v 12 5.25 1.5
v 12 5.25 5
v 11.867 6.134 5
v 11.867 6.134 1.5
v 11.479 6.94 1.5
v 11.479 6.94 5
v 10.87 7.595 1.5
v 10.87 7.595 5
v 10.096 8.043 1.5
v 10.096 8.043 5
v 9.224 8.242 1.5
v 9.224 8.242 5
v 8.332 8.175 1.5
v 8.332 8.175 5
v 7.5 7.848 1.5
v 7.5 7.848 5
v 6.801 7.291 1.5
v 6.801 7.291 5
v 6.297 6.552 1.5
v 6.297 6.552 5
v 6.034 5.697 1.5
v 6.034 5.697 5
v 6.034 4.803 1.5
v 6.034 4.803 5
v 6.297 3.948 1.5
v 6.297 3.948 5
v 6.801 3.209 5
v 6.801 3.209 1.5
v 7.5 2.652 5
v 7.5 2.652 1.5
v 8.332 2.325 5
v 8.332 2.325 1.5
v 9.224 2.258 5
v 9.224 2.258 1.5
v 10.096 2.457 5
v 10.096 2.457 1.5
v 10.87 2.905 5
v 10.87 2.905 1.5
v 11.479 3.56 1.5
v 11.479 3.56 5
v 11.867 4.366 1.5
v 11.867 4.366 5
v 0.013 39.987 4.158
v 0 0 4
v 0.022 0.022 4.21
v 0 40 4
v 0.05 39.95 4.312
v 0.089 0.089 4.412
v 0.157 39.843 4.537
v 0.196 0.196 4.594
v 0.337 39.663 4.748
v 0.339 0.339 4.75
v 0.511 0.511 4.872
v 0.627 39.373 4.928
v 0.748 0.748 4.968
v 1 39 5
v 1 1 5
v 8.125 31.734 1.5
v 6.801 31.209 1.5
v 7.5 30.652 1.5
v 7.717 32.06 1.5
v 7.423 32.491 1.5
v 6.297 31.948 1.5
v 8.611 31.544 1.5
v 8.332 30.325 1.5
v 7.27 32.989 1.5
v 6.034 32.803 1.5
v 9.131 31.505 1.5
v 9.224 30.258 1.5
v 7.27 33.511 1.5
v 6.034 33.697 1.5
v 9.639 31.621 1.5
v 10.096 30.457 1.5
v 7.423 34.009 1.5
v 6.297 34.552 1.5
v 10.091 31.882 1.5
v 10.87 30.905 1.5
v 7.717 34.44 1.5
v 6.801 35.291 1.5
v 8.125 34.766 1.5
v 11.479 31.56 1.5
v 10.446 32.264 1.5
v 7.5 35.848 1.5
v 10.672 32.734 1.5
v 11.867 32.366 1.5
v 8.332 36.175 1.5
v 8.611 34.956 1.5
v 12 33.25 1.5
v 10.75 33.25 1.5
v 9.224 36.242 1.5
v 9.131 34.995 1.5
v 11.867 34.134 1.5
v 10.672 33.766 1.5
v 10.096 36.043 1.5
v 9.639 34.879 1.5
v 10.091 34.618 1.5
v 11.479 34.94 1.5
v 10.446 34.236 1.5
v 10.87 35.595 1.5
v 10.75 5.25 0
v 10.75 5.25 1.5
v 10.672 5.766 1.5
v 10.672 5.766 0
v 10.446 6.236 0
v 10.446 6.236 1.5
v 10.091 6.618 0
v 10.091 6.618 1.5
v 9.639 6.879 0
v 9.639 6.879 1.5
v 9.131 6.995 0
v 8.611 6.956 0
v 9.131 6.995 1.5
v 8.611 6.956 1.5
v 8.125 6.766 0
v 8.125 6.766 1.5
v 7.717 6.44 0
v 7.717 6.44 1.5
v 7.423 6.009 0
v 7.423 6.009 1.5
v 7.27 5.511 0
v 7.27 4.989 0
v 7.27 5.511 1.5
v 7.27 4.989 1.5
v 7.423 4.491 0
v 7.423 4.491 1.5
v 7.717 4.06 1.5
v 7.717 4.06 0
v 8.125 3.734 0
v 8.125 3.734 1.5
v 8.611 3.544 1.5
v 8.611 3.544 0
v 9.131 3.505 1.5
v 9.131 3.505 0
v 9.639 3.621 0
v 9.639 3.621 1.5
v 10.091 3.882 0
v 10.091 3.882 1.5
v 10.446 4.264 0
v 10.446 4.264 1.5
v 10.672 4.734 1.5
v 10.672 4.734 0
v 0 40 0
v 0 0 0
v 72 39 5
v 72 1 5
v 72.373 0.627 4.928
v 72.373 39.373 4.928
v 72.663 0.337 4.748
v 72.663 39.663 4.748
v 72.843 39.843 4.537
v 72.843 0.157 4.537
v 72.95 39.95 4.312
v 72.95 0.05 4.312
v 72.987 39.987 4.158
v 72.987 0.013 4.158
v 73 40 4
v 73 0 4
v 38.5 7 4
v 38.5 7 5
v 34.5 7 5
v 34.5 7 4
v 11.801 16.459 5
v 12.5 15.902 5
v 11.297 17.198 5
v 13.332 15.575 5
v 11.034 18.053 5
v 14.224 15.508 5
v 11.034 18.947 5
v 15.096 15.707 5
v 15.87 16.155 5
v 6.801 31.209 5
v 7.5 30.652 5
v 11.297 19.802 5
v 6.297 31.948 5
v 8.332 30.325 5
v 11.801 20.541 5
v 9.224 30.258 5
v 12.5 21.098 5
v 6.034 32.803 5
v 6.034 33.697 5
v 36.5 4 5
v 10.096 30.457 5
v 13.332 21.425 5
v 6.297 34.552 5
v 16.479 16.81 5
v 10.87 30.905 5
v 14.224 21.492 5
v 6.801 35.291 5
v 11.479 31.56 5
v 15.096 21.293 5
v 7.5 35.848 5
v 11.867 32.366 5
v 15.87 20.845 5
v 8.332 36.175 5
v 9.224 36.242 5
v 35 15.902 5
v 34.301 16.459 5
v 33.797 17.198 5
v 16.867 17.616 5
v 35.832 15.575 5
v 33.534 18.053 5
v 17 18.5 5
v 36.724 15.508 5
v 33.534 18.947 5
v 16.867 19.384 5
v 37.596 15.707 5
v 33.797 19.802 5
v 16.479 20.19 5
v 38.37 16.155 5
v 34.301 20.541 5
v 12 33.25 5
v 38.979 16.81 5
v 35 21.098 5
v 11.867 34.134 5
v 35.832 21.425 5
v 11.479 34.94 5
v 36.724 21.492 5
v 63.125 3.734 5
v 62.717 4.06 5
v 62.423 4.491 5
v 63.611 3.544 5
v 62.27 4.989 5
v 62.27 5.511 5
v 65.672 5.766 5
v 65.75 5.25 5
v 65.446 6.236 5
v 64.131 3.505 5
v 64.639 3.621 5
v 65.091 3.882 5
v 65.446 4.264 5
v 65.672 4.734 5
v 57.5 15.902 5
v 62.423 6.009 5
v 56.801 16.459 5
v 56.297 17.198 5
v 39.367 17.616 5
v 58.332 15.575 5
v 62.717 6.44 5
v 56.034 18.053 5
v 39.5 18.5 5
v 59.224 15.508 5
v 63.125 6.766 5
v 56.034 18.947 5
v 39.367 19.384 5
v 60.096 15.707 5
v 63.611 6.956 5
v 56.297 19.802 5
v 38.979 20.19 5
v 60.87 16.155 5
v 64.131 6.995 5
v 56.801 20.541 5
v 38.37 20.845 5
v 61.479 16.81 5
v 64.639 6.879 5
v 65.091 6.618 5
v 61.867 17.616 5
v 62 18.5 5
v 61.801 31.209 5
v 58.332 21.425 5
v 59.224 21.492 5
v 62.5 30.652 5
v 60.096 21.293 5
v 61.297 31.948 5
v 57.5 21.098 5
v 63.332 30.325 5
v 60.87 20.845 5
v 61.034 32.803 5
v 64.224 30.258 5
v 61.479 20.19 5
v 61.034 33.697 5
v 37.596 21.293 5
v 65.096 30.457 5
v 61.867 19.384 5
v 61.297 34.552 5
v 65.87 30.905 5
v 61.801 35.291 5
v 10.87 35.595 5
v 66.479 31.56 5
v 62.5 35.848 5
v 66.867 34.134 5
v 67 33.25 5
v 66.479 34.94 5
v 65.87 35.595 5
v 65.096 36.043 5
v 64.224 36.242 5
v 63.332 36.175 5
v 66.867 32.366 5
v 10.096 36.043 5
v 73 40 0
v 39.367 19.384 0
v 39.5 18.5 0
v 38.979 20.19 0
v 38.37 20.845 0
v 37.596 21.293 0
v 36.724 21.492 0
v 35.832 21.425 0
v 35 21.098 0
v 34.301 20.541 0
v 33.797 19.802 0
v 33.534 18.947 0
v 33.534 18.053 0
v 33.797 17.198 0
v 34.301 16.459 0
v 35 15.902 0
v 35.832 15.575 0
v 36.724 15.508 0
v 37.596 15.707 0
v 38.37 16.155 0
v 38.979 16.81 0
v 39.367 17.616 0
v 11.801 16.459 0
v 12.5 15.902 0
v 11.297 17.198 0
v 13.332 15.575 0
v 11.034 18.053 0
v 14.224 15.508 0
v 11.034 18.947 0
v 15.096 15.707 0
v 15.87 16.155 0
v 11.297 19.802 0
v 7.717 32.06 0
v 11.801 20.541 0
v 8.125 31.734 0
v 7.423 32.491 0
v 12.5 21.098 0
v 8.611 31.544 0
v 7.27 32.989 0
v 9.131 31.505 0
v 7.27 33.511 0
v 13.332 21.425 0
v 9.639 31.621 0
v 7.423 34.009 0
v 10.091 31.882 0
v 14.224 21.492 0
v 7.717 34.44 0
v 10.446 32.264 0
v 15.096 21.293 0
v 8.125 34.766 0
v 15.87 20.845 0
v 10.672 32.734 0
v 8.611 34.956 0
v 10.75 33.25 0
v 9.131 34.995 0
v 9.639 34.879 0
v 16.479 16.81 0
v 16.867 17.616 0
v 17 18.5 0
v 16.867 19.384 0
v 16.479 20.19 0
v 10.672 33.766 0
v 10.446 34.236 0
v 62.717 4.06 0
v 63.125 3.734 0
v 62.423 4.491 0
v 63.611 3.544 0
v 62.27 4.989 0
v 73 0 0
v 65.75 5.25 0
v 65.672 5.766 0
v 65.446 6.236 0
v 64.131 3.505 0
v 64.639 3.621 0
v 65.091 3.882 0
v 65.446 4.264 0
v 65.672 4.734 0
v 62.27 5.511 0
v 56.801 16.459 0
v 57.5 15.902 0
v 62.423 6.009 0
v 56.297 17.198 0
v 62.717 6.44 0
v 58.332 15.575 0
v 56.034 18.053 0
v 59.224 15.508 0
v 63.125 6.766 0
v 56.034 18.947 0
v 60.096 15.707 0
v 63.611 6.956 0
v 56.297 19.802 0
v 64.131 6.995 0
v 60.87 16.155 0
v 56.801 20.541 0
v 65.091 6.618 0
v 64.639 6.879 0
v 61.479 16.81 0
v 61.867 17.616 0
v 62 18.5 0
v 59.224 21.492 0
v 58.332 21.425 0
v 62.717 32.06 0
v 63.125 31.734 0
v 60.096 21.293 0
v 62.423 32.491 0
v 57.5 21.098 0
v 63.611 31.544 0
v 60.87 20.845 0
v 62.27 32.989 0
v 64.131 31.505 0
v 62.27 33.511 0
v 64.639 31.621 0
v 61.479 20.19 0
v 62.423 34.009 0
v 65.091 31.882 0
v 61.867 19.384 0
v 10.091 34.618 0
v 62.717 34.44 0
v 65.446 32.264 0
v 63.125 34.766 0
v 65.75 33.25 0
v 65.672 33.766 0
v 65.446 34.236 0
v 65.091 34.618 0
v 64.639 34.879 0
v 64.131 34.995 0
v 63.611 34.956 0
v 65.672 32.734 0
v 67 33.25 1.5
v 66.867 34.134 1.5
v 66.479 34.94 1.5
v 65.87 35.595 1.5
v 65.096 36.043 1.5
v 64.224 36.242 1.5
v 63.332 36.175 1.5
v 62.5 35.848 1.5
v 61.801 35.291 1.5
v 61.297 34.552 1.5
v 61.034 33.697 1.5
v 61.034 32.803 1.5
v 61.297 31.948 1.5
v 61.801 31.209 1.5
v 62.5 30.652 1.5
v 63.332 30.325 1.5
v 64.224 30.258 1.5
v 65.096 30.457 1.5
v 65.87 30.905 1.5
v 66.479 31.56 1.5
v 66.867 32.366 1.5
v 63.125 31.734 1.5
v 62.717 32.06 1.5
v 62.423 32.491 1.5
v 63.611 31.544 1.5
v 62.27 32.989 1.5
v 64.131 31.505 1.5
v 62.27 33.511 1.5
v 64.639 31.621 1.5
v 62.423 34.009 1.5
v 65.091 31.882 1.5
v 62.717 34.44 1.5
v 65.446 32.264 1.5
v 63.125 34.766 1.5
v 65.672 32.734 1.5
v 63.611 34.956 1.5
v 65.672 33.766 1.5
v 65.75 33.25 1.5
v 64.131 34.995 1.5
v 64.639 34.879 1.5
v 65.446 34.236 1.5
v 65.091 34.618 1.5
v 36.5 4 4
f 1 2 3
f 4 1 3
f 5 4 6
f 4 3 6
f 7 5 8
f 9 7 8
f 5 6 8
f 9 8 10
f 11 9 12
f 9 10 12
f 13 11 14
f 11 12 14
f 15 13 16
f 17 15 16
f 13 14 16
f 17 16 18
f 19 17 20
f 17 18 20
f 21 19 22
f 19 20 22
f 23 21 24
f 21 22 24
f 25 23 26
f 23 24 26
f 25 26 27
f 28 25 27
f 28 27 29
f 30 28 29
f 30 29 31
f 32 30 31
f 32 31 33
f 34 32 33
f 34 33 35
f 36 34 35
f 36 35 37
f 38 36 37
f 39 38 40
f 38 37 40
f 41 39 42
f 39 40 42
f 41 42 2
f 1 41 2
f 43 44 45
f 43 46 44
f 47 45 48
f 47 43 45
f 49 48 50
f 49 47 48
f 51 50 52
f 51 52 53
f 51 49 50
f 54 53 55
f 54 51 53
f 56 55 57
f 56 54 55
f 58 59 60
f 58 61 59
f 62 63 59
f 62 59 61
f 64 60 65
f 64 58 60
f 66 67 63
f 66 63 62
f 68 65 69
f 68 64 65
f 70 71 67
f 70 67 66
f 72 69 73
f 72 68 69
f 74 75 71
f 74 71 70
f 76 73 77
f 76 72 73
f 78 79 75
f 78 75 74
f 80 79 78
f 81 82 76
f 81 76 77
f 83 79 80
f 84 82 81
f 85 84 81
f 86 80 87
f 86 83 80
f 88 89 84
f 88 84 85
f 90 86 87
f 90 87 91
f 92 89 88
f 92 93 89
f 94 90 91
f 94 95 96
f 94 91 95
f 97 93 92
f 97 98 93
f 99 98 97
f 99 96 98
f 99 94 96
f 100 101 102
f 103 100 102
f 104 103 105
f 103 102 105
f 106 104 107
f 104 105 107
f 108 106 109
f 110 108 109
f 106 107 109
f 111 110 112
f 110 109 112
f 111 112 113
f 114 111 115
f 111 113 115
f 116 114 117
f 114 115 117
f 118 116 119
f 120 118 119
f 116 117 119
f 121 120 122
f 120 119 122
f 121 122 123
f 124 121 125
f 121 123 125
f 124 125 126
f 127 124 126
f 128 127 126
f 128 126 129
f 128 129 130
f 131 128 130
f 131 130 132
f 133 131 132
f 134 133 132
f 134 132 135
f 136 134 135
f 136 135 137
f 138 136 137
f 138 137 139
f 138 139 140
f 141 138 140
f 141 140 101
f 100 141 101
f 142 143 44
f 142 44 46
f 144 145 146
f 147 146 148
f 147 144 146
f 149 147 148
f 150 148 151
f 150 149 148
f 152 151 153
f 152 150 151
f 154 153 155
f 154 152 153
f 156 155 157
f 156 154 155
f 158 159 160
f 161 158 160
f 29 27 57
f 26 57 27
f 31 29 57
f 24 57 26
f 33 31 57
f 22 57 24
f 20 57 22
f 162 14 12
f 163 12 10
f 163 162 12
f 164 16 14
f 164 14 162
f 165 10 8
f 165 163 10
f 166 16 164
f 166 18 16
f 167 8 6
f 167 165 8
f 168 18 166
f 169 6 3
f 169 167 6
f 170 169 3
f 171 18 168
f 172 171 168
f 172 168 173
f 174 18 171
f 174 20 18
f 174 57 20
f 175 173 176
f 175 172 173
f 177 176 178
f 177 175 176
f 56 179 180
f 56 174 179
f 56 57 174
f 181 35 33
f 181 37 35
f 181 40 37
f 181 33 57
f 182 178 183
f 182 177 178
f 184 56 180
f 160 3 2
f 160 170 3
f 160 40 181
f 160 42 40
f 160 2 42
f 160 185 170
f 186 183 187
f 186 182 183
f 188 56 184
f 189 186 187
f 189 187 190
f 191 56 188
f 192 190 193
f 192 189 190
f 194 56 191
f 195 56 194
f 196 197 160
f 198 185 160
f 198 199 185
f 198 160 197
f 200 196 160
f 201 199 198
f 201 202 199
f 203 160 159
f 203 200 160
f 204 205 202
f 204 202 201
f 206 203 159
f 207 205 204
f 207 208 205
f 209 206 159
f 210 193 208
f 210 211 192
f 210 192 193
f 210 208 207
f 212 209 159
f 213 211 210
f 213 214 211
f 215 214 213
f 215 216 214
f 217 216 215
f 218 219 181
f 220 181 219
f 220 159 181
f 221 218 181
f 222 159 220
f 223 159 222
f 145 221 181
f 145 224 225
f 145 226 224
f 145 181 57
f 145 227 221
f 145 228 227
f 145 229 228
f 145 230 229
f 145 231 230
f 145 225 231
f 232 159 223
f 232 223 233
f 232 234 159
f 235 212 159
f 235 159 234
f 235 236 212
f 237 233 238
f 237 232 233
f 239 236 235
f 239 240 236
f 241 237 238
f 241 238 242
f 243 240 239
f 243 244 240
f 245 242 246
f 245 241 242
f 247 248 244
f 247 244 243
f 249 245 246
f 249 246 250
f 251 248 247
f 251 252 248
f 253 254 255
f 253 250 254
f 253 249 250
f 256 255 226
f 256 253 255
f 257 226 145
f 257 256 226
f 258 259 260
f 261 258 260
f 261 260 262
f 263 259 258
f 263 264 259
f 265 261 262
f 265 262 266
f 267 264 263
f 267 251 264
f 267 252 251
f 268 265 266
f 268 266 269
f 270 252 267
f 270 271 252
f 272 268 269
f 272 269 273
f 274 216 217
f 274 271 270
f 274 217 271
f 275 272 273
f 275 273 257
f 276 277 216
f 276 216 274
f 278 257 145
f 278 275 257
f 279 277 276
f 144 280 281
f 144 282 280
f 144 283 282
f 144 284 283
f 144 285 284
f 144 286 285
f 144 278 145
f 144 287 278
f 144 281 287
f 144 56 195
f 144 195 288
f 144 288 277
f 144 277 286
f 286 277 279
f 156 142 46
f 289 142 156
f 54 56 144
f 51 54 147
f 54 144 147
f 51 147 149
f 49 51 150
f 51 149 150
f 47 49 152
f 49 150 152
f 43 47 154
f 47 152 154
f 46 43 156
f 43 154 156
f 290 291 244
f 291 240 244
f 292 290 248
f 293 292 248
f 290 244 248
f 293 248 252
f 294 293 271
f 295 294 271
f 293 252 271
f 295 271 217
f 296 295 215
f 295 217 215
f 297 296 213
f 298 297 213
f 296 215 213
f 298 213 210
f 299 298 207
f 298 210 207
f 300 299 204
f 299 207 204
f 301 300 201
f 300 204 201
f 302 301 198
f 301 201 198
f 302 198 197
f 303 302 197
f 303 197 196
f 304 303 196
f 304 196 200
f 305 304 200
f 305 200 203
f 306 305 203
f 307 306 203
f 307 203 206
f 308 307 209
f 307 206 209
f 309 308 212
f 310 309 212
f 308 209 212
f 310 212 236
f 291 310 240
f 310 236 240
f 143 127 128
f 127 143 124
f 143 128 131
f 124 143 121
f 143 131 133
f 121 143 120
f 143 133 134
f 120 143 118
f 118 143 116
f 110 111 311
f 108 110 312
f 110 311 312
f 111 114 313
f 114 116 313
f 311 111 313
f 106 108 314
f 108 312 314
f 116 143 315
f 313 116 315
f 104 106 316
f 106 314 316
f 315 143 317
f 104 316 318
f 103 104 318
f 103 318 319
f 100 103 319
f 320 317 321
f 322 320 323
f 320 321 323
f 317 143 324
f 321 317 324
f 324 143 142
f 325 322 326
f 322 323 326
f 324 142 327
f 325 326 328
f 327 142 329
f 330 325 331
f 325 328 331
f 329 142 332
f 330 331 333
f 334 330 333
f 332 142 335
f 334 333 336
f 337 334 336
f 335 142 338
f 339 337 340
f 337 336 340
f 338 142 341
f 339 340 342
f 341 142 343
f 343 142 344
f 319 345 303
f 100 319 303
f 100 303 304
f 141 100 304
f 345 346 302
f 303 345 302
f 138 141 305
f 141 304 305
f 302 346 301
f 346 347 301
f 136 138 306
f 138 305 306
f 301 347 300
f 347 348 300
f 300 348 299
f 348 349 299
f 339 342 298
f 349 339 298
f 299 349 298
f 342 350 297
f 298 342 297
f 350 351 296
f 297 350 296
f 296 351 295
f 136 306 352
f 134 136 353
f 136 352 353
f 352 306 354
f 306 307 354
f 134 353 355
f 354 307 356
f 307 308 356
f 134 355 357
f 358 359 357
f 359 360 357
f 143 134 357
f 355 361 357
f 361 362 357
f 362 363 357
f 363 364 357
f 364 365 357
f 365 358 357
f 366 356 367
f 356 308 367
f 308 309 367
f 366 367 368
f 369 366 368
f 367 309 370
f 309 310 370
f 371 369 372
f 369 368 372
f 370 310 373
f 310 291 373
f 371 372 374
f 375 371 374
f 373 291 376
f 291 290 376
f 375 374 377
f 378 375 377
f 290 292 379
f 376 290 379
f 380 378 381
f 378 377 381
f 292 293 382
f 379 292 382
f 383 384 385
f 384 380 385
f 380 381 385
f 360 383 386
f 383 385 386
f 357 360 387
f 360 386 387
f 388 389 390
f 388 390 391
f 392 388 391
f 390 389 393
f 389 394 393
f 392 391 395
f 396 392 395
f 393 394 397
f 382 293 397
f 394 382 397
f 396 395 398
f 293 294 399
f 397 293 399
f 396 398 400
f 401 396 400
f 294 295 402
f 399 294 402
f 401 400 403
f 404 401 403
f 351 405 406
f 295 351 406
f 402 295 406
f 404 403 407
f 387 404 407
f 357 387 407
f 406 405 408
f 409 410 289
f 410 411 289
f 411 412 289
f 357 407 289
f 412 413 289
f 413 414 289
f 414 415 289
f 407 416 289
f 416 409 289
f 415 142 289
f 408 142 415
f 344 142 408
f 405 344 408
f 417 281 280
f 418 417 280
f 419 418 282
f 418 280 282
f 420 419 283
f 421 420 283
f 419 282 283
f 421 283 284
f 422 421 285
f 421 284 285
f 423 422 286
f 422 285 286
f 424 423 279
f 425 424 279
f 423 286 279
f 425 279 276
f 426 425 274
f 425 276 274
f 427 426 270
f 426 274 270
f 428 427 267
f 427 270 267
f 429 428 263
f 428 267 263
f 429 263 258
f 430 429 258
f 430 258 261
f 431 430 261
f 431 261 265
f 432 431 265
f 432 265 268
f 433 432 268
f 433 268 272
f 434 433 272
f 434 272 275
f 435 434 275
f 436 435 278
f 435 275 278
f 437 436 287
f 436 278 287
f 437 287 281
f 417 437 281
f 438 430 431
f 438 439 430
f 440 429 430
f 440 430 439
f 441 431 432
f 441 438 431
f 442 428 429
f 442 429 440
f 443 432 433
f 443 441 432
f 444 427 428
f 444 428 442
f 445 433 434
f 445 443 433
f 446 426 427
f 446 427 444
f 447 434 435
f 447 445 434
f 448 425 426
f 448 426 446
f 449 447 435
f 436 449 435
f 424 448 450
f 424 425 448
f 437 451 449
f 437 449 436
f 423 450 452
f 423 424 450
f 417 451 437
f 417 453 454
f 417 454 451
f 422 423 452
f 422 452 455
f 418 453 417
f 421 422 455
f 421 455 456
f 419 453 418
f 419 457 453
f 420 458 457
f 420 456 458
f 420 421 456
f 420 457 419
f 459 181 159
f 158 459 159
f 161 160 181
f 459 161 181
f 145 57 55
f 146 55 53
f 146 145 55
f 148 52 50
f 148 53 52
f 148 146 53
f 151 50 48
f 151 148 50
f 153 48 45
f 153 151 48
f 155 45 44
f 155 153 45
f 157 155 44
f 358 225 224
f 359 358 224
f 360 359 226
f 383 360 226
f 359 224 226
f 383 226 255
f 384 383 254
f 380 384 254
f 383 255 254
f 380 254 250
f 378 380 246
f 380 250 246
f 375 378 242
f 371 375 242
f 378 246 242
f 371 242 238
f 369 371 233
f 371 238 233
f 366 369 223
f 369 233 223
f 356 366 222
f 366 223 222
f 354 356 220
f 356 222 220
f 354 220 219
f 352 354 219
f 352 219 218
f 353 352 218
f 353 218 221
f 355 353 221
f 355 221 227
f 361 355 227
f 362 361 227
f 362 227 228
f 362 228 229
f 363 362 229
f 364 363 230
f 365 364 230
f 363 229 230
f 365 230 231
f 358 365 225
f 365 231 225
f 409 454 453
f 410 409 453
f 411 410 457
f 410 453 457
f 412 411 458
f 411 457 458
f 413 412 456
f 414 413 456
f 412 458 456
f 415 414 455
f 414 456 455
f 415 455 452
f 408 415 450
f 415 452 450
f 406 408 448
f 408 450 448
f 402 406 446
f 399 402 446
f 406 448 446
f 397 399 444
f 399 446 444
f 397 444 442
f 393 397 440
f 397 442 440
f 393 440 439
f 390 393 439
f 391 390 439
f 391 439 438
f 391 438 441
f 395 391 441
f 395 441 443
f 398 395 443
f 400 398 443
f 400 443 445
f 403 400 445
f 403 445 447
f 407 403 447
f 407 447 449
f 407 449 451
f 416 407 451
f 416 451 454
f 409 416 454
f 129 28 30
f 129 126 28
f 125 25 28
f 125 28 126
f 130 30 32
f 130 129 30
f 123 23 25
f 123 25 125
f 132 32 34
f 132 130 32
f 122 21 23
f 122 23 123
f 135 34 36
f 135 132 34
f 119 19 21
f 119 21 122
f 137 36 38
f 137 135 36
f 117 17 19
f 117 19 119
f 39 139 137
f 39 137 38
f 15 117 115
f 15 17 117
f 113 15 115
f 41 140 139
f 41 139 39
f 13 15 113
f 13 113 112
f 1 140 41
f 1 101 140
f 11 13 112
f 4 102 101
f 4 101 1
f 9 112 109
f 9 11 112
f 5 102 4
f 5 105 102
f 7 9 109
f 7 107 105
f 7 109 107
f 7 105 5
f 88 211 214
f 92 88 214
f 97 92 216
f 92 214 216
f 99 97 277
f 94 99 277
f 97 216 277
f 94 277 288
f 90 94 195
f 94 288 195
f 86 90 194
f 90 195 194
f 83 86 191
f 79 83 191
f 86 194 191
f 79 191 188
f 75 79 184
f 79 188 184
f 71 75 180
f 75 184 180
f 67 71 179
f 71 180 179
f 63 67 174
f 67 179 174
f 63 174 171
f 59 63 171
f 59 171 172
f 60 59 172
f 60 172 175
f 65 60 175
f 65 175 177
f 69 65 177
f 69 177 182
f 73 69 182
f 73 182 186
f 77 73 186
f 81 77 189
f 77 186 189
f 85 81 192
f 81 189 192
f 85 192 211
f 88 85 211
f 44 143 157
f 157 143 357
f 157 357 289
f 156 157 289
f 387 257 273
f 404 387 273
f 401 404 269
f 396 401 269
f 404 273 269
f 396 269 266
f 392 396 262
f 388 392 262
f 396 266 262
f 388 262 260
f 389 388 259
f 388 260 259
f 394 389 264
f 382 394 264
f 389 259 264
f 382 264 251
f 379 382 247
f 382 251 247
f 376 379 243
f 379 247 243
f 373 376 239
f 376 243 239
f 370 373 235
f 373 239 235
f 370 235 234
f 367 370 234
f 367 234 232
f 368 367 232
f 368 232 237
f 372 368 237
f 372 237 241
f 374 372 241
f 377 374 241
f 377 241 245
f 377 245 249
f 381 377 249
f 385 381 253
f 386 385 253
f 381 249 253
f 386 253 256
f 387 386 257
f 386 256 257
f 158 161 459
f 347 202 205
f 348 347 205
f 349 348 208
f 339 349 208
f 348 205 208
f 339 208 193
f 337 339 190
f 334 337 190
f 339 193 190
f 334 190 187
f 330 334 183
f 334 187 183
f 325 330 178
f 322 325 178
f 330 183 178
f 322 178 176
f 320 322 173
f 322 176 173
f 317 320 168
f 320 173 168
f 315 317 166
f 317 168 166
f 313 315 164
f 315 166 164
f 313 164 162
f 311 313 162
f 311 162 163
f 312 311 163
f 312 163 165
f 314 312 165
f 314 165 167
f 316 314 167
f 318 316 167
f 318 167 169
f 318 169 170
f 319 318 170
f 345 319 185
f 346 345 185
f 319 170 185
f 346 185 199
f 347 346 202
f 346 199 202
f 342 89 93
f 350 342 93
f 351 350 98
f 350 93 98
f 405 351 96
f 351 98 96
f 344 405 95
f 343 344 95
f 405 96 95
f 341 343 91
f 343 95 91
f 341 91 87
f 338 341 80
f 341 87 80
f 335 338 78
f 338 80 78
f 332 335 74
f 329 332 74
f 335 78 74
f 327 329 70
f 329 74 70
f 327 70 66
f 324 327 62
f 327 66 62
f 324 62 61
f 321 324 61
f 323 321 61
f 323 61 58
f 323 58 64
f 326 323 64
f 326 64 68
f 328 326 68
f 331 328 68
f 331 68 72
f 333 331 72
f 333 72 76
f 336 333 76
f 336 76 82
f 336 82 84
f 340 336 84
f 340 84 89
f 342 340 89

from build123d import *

# Parameters (mm, degrees)
SKETCH019_W     = 73
SKETCH019_H     = 40
PAD006_DEPTH    = 5
SKETCH020_R     = 3
SKETCH020_R_2   = 1.75
POCKET011_DEPTH = 5
SKETCH021_R     = 3
POCKET012_DEPTH = 3.5
FILLET_R        = 1
POCKET014_DEPTH = 1


with BuildPart() as part:
    # Sketch019 → Pad006 (new body)
    with BuildSketch(Plane.XY):
        with Locations((36.5, 20)):
            Rectangle(SKETCH019_W, SKETCH019_H)
    extrude(amount=PAD006_DEPTH)

    # Sketch020 (on Face6 of Pad006) → Pocket011 (cut)
    with BuildSketch(Plane.XY.offset(5)):
        with Locations((14, 18.5)):
            Circle(SKETCH020_R)
        with Locations((59, 18.5)):
            Circle(SKETCH020_R)
        with Locations((36.5, 18.5)):
            Circle(SKETCH020_R)
        with Locations((9, 33.25)):
            Circle(SKETCH020_R_2)
        with Locations((64, 33.25)):
            Circle(SKETCH020_R_2)
        with Locations((64, 5.25)):
            Circle(SKETCH020_R_2)
        with Locations((9, 5.25)):
            Circle(SKETCH020_R_2)
    extrude(amount=-POCKET011_DEPTH, mode=Mode.SUBTRACT)

    # Sketch021 (on Face5 of Pocket011) → Pocket012 (cut)
    with BuildSketch(Plane.XY.offset(5)):
        with Locations((36.5, 18.5)):
            Circle(SKETCH021_R)
        with Locations((9, 5.25)):
            Circle(SKETCH021_R)
        with Locations((64, 33.25)):
            Circle(SKETCH021_R)
        with Locations((9, 33.25)):
            Circle(SKETCH021_R)
    extrude(amount=-POCKET012_DEPTH, mode=Mode.SUBTRACT)

    # Fillet
    fillet_edges = [part.edges().sort_by_distance(p)[0] for p in [
        (73, 20, 5),
        (36.5, 40, 5),
        (0, 20, 5),
        (36.5, 0, 5),
    ]]
    fillet(fillet_edges, radius=FILLET_R)

    # Sketch023 (on Face8 of Fillet) → Pocket014 (cut)
    with BuildSketch(Plane.XY.offset(5)):
        Polygon((36.5, 4), (38.5, 7), (34.5, 7), align=None)
    extrude(amount=-POCKET014_DEPTH, mode=Mode.SUBTRACT)


solid = part.part
